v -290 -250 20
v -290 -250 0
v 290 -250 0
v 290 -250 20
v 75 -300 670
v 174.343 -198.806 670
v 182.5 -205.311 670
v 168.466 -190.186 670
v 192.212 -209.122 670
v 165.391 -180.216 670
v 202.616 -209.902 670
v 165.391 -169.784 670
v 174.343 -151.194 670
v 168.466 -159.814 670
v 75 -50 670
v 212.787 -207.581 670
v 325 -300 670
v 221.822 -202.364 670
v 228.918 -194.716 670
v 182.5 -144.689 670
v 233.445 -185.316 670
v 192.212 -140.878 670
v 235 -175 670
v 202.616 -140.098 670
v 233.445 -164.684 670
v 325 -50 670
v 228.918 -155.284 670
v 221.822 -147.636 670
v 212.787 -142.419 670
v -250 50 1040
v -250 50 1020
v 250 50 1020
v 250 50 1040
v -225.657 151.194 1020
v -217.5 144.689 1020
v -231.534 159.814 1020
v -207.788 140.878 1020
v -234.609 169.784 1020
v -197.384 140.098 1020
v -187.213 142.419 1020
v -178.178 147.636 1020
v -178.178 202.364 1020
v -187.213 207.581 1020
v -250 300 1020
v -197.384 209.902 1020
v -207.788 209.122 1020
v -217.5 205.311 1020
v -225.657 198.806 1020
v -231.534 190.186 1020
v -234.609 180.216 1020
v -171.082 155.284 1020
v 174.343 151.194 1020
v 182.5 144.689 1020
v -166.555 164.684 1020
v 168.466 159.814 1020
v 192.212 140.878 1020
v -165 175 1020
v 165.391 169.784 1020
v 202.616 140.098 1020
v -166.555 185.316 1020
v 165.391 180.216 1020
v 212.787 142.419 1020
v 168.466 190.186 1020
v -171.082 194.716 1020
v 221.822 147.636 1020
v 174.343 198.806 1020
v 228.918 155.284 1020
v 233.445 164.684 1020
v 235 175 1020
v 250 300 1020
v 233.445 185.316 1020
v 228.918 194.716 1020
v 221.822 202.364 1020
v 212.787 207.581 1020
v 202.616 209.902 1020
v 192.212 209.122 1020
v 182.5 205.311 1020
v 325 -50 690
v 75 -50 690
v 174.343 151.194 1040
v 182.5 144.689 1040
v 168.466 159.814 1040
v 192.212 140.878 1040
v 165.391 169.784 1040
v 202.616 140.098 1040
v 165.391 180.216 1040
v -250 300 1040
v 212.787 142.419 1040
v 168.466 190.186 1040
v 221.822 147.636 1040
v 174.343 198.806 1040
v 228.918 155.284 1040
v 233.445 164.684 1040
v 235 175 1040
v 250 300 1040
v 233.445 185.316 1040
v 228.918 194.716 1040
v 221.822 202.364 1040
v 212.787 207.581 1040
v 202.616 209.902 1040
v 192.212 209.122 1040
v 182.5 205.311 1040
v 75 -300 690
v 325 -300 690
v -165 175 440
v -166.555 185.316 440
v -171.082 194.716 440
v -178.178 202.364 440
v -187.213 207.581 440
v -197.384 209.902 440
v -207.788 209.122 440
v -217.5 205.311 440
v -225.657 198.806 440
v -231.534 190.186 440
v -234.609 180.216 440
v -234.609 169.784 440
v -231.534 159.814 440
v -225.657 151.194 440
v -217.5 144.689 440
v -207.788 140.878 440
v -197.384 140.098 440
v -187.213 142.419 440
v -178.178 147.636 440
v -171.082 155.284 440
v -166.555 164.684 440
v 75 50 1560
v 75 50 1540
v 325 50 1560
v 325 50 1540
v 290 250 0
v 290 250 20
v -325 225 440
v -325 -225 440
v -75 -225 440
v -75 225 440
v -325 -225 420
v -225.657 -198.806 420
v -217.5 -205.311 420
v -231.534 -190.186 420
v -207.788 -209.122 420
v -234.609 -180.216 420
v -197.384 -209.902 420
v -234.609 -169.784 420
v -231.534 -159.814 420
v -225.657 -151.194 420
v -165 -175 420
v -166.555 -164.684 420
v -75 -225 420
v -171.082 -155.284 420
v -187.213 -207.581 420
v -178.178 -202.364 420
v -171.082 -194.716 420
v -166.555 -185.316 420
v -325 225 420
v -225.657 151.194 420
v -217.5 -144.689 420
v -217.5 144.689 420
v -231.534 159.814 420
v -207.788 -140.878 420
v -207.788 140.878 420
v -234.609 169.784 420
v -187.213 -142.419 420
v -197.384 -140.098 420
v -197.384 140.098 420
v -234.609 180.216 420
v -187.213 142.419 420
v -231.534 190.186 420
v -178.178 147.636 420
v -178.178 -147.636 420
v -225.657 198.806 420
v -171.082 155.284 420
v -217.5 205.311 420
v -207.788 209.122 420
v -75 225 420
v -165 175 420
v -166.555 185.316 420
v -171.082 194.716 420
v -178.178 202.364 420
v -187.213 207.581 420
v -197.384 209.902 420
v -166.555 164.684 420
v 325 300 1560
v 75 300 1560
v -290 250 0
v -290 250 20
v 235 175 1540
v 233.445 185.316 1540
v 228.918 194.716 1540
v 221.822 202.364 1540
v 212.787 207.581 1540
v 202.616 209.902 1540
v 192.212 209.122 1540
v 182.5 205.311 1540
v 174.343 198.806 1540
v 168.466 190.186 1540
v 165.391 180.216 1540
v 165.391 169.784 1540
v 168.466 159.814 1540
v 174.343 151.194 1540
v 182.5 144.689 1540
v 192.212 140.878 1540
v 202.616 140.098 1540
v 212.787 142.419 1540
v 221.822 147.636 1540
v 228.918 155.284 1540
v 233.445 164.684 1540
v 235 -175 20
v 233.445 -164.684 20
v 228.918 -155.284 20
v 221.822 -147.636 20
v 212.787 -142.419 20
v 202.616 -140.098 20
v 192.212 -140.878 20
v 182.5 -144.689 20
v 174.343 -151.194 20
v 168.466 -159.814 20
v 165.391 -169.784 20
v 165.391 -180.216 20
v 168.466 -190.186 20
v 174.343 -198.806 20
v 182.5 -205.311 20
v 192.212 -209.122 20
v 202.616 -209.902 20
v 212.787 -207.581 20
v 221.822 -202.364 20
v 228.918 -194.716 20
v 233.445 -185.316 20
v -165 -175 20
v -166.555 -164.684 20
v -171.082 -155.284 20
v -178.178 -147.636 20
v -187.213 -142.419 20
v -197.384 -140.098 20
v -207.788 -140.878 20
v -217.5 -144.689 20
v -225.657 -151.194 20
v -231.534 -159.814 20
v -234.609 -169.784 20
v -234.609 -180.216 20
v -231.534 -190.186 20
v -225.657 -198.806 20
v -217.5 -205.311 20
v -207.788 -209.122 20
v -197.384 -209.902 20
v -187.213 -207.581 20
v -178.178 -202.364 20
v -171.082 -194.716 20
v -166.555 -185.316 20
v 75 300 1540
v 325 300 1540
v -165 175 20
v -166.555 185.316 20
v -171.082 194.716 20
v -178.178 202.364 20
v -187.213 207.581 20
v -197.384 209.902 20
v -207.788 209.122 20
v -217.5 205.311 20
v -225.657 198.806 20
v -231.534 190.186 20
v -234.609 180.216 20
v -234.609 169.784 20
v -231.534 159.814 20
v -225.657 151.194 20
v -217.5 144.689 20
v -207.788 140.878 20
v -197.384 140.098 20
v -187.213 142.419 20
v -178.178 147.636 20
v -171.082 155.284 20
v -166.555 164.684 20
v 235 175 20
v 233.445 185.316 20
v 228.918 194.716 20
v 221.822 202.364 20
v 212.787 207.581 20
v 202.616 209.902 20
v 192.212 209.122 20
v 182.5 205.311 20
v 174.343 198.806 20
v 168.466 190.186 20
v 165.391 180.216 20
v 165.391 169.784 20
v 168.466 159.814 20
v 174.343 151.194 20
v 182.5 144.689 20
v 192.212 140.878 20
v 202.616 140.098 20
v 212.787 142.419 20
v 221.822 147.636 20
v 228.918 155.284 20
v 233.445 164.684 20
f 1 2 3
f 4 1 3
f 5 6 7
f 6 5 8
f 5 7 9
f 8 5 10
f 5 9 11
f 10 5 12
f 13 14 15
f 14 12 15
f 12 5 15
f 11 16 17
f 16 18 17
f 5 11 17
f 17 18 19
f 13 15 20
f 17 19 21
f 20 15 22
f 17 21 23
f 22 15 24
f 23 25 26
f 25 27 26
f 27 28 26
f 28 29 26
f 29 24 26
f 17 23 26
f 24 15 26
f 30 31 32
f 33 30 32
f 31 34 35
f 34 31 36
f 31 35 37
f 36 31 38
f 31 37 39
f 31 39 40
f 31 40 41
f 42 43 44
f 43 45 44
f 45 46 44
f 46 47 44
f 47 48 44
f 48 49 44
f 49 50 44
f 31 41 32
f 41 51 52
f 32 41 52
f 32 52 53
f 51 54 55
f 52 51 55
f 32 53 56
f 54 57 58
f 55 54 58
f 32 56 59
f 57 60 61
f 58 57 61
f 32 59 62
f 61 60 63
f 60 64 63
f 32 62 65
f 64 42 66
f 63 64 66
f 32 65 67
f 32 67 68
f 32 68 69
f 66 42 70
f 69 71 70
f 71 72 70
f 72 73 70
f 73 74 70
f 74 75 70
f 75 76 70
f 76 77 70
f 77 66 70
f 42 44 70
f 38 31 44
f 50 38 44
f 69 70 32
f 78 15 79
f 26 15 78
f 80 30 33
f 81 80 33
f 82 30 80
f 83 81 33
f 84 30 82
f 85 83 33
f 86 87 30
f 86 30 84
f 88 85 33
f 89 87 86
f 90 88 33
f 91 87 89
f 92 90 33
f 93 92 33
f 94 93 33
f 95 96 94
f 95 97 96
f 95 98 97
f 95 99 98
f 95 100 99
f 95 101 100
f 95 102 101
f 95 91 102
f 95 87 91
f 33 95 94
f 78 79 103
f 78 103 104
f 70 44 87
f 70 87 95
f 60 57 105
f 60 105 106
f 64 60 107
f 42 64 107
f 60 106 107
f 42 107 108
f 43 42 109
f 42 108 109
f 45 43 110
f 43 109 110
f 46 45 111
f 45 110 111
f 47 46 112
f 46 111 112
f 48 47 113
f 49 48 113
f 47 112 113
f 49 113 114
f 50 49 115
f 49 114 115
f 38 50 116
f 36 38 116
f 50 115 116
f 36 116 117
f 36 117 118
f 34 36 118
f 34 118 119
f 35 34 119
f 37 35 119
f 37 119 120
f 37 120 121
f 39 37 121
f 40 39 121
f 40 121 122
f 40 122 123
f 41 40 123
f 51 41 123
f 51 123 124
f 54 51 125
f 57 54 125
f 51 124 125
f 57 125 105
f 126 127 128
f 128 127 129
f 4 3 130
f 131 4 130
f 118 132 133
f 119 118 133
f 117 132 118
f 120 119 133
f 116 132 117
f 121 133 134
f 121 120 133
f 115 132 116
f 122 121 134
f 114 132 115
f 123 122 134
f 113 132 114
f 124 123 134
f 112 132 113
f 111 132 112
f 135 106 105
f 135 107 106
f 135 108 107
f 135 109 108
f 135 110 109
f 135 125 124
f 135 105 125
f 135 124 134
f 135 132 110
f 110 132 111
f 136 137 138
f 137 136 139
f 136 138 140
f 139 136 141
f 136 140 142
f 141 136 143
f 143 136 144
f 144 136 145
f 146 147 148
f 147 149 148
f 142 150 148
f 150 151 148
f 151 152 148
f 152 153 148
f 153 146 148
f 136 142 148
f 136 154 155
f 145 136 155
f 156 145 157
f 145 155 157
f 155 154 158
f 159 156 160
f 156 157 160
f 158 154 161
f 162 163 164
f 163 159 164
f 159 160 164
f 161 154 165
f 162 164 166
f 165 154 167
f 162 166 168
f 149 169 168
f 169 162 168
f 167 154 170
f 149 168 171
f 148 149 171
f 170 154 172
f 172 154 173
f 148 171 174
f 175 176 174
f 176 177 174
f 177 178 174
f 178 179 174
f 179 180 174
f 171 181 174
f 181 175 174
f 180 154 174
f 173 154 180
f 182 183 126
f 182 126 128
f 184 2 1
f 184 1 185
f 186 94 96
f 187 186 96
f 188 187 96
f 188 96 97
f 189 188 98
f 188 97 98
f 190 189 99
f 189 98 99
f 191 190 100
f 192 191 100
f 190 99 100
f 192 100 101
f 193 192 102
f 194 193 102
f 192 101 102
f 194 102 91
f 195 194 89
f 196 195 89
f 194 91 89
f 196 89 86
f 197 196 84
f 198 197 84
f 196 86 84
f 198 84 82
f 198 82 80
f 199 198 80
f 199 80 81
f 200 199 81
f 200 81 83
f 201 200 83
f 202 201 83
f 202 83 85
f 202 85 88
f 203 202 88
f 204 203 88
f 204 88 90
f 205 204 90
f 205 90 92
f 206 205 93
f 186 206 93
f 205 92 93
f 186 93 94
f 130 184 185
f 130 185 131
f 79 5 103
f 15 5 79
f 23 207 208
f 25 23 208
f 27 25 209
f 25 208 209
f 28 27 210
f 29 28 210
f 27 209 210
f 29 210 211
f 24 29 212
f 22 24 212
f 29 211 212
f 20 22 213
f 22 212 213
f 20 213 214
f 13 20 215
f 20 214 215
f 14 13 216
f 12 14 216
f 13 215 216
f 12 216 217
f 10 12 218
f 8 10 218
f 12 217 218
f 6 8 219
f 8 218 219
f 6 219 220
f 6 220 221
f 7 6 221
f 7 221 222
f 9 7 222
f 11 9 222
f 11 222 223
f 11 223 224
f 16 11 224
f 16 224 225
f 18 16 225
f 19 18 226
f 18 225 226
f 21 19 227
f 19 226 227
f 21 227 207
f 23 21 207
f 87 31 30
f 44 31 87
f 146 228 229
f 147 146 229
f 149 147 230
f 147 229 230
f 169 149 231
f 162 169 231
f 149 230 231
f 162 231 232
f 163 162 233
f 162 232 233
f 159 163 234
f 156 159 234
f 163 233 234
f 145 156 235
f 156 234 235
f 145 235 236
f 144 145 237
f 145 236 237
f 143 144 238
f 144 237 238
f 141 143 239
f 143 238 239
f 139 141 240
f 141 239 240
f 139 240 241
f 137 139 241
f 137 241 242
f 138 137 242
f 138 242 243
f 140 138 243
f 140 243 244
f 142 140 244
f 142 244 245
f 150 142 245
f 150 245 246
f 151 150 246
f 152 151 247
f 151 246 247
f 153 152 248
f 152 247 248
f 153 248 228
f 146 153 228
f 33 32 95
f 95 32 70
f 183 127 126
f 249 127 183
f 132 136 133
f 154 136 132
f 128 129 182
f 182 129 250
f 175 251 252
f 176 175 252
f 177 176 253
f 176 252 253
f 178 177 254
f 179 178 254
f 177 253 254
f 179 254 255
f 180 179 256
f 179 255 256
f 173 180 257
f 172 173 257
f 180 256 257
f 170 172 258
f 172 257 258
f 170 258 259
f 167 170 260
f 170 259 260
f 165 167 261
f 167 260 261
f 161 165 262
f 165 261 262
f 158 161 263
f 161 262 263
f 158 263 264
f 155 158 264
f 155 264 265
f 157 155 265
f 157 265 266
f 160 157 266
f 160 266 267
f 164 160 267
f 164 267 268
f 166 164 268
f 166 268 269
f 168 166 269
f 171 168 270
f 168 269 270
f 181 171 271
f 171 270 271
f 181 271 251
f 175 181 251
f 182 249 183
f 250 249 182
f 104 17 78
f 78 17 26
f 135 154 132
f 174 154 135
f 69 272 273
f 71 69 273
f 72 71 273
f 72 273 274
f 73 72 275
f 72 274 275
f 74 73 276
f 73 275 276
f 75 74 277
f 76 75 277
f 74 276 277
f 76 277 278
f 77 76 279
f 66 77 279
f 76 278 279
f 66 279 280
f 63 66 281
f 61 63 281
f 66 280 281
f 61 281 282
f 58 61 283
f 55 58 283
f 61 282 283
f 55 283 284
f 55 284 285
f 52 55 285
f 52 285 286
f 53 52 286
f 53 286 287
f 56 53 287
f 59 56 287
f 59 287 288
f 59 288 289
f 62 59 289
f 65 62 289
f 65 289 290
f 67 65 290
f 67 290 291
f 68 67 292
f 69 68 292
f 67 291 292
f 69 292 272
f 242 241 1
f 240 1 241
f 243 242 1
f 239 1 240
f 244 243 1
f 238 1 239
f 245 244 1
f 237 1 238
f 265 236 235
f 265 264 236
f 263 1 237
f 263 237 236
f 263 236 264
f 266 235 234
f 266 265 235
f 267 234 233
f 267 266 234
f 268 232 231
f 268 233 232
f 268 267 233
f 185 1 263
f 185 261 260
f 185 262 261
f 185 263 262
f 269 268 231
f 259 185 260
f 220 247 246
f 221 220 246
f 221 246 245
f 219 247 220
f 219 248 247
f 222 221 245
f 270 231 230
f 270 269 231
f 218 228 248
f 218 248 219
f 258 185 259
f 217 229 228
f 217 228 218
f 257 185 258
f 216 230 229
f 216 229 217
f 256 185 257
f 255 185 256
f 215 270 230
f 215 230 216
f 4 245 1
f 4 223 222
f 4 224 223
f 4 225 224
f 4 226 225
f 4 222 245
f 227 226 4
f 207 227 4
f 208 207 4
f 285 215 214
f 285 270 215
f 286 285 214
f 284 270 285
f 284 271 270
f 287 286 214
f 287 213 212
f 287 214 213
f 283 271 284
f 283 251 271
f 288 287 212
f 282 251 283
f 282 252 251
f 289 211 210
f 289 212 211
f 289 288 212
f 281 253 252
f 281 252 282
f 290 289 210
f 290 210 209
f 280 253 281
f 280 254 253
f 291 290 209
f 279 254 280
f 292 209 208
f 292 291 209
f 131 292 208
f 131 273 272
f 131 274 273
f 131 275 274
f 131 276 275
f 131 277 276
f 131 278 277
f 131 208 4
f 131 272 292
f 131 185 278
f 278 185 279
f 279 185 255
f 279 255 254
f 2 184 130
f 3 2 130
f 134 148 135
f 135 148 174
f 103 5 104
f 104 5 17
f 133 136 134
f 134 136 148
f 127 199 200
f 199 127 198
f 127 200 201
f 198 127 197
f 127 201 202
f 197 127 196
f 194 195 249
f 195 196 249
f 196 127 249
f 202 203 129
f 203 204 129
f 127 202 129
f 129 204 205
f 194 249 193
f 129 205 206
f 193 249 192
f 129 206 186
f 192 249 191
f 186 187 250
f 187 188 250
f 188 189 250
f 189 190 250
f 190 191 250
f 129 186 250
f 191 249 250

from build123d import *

# Parameters (mm, degrees)
F0_W      = 580
F0_H      = 500
F1_DEPTH  = 20
F2_R      = 35
F3_DEPTH  = 400
F4_W      = 250
F4_H      = 450
F5_DEPTH  = 20
F6_DEPTH  = 1000
F7_R      = 35
F8_DEPTH  = 580
F9_DEPTH  = 650
F10_W     = 250
F10_H     = 250
F10_R     = 35
F11_DEPTH = 20
F12_W     = 500
F12_H     = 250
F13_DEPTH = 20
F14_R     = 35
F15_DEPTH = 500
F16_W     = 250
F16_H     = 250
F17_DEPTH = 20


with BuildPart() as f1:
    # F0 (on Top) → F1 (new body)
    with BuildSketch(Plane.XY):
        Rectangle(F0_W, F0_H)
    extrude(amount=F1_DEPTH)

    # F2 (on face) → F3 (join)
    with BuildSketch(Plane.XY.offset(20)):
        with Locations((-200, 175)):
            Circle(F2_R)
        with Locations((-200, -175)):
            Circle(F2_R)
    extrude(amount=F3_DEPTH)

    # F4 (on face) → F5 (join)
    with BuildSketch(Plane.XY.offset(420)):
        with Locations((-200, 0)):
            Rectangle(F4_W, F4_H)
    extrude(amount=F5_DEPTH)

    # F2 (on face) → F6 (join)
    with BuildSketch(Plane.XY.offset(20)):
        with Locations((200, 175)):
            Circle(F2_R)
    extrude(amount=F6_DEPTH)

    # F7 (on face) → F8 (join, through all)
    with BuildSketch(Plane.XY.offset(440)):
        with Locations((-200, 175)):
            Circle(F7_R)
    extrude(amount=F8_DEPTH)

    # F2 (on face) → F9 (join)
    with BuildSketch(Plane.XY.offset(20)):
        with Locations((200, -175)):
            Circle(F2_R)
    extrude(amount=F9_DEPTH)

    # F10 (on face) → F11 (join)
    with BuildSketch(Plane.XY.offset(670)):
        with Locations((200, -175)):
            Rectangle(F10_W, F10_H)
        with Locations((200, -175)):
            Circle(F10_R, mode=Mode.SUBTRACT)
        with Locations((200, -175)):
            Circle(F10_R)
    extrude(amount=F11_DEPTH)

    # F12 (on face) → F13 (join)
    with BuildSketch(Plane.XY.offset(1020)):
        with Locations((0, 175)):
            Rectangle(F12_W, F12_H)
    extrude(amount=F13_DEPTH)

    # F14 (on face) → F15 (join)
    with BuildSketch(Plane.XY.offset(1040)):
        with Locations((200, 175)):
            Circle(F14_R)
    extrude(amount=F15_DEPTH)

    # F16 (on face) → F17 (join)
    with BuildSketch(Plane.XY.offset(1540)):
        with Locations((200, 175)):
            Rectangle(F16_W, F16_H)
    extrude(amount=F17_DEPTH)


solid = f1.part
